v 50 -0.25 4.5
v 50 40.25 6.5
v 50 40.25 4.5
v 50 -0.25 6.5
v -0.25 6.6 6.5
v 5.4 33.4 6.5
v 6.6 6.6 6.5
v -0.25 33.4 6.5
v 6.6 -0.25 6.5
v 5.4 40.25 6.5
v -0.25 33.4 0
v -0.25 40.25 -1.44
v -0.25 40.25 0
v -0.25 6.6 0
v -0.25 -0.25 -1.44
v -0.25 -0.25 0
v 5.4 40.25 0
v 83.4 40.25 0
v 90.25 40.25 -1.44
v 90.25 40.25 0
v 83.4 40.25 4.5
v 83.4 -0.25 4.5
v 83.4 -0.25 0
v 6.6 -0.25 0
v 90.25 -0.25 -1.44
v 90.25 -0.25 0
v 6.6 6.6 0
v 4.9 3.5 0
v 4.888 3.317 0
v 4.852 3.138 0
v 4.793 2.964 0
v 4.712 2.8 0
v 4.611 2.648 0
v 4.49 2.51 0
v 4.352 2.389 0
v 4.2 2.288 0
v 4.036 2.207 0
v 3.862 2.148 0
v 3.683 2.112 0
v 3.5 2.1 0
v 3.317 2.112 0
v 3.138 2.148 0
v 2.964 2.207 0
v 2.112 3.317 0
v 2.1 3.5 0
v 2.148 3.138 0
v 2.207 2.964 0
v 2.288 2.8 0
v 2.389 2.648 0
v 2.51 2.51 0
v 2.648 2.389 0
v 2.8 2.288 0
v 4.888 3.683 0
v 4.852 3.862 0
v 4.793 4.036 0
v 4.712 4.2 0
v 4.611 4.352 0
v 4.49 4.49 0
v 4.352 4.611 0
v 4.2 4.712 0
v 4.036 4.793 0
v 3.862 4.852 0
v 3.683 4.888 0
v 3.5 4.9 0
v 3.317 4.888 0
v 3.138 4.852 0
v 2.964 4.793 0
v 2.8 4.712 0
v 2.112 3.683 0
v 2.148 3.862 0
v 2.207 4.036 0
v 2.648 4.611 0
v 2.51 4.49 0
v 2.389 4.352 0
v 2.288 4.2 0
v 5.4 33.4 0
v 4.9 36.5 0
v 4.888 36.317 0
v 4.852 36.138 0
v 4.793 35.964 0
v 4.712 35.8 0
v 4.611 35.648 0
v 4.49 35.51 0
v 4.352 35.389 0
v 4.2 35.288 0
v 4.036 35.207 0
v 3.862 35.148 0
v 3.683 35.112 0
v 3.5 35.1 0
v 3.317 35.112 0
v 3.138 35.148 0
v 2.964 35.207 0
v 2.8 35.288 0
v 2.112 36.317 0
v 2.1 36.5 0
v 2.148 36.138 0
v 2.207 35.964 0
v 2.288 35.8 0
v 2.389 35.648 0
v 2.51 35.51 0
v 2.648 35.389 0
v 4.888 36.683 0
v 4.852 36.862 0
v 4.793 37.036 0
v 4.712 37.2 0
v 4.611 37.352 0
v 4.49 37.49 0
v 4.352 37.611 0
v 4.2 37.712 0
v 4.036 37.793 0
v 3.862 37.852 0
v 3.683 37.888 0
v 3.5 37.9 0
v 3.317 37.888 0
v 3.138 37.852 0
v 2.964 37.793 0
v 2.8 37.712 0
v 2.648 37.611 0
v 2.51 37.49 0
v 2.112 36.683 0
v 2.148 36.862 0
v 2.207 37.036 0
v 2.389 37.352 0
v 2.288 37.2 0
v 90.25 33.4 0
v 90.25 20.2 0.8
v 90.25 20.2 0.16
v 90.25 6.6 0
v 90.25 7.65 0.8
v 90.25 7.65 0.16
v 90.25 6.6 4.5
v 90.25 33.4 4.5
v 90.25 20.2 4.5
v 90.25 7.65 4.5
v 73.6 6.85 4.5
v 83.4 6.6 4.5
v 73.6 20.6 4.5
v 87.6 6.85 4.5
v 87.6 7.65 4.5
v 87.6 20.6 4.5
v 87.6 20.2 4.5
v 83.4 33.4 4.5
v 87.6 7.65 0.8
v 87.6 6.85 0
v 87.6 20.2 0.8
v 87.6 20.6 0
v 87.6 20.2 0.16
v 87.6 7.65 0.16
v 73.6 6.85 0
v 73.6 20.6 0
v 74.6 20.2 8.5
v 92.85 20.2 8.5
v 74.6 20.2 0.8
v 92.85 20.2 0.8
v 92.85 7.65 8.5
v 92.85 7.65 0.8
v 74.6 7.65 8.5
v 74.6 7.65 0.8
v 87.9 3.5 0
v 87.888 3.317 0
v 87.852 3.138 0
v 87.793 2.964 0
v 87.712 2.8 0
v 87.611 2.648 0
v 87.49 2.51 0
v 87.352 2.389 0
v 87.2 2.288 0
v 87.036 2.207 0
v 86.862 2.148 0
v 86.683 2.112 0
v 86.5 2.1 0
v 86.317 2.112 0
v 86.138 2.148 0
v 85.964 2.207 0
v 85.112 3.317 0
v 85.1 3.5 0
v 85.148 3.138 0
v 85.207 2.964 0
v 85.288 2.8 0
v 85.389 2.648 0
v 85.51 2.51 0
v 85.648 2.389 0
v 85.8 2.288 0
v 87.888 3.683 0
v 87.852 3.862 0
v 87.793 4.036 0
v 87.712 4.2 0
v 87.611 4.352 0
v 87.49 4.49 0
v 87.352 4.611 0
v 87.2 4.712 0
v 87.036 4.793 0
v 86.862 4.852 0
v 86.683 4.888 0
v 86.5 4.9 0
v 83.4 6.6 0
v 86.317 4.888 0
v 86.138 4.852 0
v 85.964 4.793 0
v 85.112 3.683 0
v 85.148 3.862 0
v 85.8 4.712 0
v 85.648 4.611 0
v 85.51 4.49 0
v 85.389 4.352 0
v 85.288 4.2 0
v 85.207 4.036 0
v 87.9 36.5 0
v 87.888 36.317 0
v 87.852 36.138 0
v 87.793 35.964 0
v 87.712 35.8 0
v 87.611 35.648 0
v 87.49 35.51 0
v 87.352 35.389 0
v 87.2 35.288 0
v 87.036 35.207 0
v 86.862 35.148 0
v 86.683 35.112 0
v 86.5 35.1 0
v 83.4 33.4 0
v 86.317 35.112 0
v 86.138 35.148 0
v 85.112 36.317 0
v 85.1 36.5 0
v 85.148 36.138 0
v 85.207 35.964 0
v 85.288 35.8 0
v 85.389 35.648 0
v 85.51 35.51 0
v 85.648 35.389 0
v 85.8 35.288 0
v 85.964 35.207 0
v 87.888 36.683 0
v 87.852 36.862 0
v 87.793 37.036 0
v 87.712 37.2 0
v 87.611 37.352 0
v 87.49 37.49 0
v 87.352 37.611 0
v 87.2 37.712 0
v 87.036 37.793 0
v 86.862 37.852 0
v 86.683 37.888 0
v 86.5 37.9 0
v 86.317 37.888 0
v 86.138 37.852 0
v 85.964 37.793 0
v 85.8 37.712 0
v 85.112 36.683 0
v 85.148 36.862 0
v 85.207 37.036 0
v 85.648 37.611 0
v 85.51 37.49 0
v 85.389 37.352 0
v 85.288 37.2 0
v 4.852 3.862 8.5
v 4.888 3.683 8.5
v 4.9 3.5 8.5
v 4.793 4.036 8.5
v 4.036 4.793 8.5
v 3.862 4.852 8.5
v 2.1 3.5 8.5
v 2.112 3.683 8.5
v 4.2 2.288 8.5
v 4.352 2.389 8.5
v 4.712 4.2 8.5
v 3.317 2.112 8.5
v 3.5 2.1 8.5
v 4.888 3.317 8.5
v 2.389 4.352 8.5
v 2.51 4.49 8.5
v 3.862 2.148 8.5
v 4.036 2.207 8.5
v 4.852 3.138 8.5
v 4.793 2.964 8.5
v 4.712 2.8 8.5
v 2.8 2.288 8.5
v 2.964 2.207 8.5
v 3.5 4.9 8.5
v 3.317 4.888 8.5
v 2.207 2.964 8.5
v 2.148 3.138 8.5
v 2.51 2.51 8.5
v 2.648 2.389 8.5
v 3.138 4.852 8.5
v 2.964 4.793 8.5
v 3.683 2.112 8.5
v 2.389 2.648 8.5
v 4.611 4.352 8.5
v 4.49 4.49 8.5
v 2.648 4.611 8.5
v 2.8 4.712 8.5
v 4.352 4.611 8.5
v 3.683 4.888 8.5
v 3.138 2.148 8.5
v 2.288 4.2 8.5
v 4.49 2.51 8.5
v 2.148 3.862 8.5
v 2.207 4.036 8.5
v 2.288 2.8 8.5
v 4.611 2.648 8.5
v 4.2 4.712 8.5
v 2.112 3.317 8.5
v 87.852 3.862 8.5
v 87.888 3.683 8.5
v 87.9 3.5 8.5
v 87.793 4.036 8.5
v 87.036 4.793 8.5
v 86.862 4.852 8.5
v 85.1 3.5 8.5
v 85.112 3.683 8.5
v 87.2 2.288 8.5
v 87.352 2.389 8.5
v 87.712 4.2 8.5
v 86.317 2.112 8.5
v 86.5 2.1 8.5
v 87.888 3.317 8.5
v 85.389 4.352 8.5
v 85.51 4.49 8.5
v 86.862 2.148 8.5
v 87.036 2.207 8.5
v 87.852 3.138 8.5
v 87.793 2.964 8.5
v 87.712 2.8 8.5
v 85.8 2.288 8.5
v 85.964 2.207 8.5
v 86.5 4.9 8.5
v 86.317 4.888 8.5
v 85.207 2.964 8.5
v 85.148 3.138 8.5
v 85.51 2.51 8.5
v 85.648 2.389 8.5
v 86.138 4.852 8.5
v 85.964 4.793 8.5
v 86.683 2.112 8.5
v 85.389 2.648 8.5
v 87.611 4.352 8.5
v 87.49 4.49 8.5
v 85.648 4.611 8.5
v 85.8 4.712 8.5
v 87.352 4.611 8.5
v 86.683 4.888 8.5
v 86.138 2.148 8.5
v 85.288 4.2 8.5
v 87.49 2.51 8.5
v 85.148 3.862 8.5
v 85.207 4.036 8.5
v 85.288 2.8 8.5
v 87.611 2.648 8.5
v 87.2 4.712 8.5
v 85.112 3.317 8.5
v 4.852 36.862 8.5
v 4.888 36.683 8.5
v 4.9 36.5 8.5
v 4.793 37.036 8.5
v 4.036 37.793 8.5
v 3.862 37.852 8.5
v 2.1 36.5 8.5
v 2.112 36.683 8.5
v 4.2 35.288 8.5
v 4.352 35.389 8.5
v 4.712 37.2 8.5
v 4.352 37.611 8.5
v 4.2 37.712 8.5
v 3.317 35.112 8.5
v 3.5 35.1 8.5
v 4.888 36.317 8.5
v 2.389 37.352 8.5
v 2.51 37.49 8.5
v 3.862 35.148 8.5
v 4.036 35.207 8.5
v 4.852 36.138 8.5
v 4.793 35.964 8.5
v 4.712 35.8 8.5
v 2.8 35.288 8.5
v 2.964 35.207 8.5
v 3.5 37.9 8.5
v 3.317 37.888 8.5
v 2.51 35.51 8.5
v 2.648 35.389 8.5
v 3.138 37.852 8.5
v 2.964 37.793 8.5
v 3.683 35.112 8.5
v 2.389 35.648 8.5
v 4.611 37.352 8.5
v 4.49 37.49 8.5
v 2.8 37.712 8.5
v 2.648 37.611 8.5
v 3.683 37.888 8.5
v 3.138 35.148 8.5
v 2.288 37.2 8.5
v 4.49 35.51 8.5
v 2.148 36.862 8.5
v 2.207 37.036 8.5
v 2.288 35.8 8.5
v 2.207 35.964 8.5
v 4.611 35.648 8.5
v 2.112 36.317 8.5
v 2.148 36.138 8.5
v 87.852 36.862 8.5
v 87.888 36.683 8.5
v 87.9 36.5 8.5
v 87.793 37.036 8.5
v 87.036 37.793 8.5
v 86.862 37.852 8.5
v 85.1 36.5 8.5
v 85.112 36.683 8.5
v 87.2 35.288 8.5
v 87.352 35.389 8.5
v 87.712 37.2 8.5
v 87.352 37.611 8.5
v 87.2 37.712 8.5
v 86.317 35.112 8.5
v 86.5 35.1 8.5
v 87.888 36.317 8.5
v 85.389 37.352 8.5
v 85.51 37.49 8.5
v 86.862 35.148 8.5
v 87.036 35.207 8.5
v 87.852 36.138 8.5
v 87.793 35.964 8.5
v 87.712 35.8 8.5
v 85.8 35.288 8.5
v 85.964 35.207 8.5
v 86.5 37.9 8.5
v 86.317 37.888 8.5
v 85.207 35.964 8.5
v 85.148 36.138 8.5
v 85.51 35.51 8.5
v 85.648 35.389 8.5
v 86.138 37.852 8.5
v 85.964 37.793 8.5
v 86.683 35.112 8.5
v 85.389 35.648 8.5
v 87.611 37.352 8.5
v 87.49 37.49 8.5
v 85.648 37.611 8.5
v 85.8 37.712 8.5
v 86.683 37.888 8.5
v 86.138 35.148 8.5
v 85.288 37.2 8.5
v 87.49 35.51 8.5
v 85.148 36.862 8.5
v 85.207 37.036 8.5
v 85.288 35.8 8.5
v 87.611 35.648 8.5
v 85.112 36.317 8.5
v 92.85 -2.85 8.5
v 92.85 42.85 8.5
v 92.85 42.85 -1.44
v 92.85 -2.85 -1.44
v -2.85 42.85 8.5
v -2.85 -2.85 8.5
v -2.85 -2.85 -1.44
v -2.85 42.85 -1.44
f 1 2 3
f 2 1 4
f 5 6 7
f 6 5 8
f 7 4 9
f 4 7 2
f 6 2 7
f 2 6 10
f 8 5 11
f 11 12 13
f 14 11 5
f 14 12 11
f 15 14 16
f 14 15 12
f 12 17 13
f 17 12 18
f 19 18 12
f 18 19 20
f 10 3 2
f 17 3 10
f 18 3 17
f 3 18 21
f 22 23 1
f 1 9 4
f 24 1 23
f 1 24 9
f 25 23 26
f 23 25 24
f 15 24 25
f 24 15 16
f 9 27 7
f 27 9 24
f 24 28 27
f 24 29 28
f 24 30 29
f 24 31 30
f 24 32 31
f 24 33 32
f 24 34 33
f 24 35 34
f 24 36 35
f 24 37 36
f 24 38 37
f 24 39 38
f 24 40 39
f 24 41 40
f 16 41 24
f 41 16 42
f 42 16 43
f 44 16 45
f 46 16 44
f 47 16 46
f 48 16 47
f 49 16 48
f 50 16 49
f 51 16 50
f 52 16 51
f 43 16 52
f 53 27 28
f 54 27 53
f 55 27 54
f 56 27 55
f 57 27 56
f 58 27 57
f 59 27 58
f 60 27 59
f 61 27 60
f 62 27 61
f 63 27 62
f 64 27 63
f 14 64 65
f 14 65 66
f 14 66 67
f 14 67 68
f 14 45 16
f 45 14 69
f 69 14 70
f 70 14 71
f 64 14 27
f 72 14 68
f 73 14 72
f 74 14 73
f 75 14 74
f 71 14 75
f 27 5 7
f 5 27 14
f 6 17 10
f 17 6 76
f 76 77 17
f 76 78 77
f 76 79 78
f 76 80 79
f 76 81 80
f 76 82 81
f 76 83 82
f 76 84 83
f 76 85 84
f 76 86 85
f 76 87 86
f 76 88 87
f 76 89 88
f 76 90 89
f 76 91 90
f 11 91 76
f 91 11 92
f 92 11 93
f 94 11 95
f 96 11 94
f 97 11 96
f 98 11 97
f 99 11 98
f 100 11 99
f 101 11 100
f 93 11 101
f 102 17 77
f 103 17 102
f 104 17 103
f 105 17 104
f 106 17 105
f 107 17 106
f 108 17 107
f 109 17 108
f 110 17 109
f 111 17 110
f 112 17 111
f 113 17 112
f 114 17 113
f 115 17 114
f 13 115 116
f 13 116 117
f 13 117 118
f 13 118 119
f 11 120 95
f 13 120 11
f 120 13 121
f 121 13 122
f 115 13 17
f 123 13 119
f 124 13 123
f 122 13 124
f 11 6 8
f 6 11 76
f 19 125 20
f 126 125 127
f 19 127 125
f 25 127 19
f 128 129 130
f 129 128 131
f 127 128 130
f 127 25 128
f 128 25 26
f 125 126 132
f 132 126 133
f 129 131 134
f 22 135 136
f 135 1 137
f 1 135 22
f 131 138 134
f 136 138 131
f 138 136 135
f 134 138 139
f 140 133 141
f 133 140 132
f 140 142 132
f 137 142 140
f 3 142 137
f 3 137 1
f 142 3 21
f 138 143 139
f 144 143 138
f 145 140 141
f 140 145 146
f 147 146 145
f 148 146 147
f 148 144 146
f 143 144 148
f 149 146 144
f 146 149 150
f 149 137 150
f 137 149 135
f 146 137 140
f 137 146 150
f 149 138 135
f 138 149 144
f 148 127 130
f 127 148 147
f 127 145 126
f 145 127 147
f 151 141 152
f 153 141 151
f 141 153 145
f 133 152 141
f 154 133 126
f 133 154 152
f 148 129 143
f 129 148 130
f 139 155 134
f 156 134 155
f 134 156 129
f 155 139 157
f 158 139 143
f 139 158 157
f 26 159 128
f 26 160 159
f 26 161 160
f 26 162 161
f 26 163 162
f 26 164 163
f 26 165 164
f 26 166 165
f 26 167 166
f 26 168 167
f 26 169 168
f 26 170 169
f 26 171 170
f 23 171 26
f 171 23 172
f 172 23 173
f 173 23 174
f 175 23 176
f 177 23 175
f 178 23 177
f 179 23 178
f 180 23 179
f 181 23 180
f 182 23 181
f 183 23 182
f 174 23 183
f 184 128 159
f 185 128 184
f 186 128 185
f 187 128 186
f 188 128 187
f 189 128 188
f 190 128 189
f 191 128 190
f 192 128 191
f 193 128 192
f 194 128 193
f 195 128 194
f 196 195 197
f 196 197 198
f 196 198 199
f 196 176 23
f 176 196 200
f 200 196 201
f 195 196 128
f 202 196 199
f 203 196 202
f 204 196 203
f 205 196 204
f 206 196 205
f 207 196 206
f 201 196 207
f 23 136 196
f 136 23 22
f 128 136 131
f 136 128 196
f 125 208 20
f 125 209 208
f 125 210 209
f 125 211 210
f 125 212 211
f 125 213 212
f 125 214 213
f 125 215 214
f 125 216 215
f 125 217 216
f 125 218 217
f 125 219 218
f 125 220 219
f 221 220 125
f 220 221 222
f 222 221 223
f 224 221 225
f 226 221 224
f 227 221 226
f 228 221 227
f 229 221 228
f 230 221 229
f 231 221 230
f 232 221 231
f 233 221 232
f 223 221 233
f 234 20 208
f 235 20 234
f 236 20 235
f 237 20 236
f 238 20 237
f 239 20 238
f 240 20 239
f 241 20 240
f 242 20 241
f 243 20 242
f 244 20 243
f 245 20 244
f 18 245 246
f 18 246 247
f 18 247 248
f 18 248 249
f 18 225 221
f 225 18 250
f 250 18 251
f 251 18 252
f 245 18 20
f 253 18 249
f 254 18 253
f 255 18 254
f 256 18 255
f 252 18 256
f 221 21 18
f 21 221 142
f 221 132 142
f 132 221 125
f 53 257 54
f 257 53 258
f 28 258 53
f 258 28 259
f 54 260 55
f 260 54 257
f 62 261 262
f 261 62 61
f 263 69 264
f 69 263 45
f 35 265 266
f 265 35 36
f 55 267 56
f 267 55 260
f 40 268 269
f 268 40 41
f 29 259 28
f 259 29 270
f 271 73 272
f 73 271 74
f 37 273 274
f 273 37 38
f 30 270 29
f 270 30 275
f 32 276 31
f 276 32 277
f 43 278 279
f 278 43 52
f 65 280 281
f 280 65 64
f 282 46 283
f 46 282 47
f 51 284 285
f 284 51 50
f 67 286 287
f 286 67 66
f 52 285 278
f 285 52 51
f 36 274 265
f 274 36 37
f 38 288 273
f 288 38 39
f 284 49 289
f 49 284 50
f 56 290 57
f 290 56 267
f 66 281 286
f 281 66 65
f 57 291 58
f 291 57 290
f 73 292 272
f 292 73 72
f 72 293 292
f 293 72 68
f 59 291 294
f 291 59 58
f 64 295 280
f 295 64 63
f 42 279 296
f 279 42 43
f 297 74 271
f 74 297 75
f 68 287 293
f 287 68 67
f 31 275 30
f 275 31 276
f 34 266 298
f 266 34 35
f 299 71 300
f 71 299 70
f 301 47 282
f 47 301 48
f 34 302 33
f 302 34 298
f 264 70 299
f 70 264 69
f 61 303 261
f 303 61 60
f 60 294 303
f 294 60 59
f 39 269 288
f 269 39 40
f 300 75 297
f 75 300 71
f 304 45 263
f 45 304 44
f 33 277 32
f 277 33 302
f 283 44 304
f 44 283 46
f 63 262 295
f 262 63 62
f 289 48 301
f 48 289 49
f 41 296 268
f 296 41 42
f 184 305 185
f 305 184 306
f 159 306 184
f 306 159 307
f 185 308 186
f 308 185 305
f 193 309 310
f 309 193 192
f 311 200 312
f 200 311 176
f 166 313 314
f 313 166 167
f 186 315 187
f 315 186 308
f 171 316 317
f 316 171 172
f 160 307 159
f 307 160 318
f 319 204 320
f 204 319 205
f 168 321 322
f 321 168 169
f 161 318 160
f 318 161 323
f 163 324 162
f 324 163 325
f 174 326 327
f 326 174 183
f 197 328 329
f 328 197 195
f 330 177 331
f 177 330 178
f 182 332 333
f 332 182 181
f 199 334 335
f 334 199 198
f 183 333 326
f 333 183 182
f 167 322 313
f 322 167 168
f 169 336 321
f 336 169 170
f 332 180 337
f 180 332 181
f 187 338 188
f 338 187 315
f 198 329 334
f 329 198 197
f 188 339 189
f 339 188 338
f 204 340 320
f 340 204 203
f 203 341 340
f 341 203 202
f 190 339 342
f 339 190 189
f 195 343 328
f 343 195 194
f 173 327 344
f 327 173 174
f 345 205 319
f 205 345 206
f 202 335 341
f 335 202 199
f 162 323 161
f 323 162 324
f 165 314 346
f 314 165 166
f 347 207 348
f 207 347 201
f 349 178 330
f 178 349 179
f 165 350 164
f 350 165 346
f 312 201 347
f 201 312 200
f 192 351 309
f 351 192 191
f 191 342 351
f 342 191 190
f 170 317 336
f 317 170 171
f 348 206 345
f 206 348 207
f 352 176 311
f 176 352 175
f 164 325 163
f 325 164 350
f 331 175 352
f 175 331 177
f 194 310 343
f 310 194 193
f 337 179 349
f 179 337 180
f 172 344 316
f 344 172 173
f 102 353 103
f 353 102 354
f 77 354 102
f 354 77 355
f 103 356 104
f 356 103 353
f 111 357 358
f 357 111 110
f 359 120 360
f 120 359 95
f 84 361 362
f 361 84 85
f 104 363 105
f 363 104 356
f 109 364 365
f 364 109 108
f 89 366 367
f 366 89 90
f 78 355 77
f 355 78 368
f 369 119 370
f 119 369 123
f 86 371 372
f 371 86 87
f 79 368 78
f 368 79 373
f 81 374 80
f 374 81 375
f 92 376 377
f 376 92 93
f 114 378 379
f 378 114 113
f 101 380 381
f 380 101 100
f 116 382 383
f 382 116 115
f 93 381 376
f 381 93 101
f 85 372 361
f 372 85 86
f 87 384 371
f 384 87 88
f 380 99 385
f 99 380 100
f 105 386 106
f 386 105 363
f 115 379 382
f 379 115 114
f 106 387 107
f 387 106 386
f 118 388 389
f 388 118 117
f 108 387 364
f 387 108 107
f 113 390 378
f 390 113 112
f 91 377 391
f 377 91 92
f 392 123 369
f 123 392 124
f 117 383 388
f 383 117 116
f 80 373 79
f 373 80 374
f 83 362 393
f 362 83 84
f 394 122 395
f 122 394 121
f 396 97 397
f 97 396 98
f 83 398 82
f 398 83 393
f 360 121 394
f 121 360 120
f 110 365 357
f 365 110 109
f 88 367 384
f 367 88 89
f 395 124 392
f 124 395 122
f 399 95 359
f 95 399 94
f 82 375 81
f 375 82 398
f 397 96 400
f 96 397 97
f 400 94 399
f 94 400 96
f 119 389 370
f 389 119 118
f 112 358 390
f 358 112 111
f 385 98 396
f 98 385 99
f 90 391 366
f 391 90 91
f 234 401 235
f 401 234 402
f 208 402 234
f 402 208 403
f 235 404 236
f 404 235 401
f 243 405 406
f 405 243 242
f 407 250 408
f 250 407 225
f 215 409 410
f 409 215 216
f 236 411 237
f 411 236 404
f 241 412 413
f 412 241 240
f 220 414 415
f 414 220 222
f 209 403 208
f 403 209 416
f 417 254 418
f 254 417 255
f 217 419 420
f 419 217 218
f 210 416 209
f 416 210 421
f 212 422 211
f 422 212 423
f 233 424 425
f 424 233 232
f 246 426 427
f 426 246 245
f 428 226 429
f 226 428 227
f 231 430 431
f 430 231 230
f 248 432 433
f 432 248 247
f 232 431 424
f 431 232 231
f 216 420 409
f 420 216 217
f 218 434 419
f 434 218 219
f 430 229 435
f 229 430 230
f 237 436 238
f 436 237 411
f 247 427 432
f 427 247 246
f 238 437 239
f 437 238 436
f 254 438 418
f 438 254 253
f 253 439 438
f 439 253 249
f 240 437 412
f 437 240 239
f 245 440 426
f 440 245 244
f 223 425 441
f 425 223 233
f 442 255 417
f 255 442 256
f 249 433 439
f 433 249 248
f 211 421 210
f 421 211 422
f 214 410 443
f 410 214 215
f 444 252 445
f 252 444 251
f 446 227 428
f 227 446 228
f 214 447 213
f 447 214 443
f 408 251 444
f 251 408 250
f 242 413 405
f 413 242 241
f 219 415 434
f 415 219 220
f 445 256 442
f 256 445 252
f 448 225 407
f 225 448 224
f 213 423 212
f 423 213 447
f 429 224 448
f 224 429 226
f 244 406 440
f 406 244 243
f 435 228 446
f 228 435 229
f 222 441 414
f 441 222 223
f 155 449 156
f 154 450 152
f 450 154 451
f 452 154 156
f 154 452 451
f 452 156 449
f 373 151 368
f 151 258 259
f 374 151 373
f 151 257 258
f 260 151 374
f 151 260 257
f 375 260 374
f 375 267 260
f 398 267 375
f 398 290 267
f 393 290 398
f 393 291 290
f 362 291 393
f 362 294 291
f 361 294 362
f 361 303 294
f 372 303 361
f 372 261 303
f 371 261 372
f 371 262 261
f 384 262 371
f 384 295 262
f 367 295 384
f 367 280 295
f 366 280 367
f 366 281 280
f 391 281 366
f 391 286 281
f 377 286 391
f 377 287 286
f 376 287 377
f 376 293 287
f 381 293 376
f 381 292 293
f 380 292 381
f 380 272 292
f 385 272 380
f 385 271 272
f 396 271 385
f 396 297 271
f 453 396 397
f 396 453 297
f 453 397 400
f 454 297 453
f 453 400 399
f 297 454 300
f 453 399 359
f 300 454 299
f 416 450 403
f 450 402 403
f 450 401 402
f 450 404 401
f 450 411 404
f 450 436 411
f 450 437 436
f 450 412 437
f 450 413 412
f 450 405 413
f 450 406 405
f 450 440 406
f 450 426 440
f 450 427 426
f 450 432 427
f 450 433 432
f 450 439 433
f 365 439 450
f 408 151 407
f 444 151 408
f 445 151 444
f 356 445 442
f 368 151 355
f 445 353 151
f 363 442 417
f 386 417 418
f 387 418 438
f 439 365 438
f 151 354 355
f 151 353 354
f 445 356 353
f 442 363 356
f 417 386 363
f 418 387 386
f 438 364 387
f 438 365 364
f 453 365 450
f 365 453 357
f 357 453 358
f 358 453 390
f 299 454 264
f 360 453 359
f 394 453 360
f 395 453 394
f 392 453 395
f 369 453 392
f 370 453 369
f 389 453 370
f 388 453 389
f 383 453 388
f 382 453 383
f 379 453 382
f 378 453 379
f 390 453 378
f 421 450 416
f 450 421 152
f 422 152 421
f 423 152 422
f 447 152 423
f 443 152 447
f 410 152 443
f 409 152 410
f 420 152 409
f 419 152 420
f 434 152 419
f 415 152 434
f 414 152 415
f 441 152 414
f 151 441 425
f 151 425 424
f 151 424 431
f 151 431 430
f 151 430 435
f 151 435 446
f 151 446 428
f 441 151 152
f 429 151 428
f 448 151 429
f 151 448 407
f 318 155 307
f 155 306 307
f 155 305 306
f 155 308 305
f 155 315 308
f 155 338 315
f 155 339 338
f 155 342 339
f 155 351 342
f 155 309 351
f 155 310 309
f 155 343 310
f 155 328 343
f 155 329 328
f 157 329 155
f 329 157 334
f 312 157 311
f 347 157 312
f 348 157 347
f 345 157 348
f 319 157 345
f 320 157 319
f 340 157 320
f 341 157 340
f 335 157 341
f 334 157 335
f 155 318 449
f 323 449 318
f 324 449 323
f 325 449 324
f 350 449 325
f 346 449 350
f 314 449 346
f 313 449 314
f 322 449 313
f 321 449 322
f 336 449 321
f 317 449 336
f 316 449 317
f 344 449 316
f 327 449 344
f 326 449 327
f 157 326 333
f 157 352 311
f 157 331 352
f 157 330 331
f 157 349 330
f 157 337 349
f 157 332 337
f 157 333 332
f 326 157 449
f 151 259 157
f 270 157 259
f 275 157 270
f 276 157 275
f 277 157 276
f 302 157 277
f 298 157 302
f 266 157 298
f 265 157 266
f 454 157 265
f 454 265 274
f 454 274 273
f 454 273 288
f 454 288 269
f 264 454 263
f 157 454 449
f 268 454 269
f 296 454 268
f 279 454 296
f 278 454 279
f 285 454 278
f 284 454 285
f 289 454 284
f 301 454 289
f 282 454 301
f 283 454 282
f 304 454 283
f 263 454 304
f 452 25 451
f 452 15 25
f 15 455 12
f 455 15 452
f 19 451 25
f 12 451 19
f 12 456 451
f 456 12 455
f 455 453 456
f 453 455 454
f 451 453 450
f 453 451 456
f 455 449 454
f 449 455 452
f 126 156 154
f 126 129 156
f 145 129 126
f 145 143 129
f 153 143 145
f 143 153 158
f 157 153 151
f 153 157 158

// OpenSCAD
// ISAC_868_Enclosure_0p80mm.scad -- Rev E.5 Uniform-Flat-Roof Waterproof Enclosure
// Coordinate System: Right-Handed AuxOrigin / Gerber / STEP (+X East 0..90, +Y North 0..40, +Z Up above F.Cu)
// Key Rev E.5 Features (1:1 synchronized with gen_enclosure.py):
//   1. 100% Uniform Flat Waterproof Top Cover (z_top = +8.50 mm across entire roof; J1..J5 DNP; zero domes or roof slots!)
//   2. Open-East Self-Draining 0.80 mm UV-Stabilized ASA / PETG Sensing Deck (X = 74.60..92.85 mm, 0.00 mm dam lip!)
//   3. Symmetric 95.70 x 45.70 mm Outer Shell with Compliant Z_SKIRT_BOT = -1.44 mm (+0.16 mm tolerance gap) &
//      Continuous 360-Deg Parker ORD 5700 Face-Seal O-Ring Groove (1.80 x 0.76 mm -> 0.92 mm gland, 23.3% squeeze, 68.3% fill)
$fn = 48;

w_pcb = 90.00;  h_pcb = 40.00;  t_pcb = 1.60;
z_skirt_bot = -1.44;            clr = 0.25;     wall = 2.60;
groove_margin = 0.400;          groove_w = 1.80;  groove_d = 0.76;
groove_r_in = 0.60;             groove_r_out = 2.40;
t_asa_window = 0.80;

win_x0 = 74.60; win_x1 = 86.60;
win_y0 = 7.65;  win_y1 = 20.20;
boss_x0 = 73.60; boss_x1 = 87.60;
boss_y0 = 6.85;  boss_y1 = 20.60;

holes = [[3.5, 3.5], [86.5, 3.5], [3.5, 36.5], [86.5, 36.5]];

module rounded_rect_2d(x0, y0, w, h, r) {
    offset(r = r)
        translate([x0 + r, y0 + r])
            square([w - 2*r, h - 2*r]);
}

module parker_oring_groove_2d() {
    difference() {
        rounded_rect_2d(-clr - wall + groove_margin, -clr - wall + groove_margin,
                        w_pcb + 2*(clr + wall - groove_margin),
                        h_pcb + 2*(clr + wall - groove_margin),
                        groove_r_out);
        rounded_rect_2d(-clr - wall + groove_margin + groove_w, -clr - wall + groove_margin + groove_w,
                        w_pcb + 2*(clr + wall - groove_margin - groove_w),
                        h_pcb + 2*(clr + wall - groove_margin - groove_w),
                        groove_r_in);
    }
}

module lid_0p80mm() {
    difference() {
        // 100% uniform flat solid-roof outer shell (95.70 x 45.70 mm, z = -1.44..+8.50 mm compliant skirt)
        translate([-clr - wall, -clr - wall, z_skirt_bot])
            cube([w_pcb + 2*(clr + wall), h_pcb + 2*(clr + wall), 8.50 - z_skirt_bot]);
        // Electronics bay internal cavity (X = 0..50 mm, uniform solid ceiling z = 6.50 mm)
        difference() {
            translate([-clr, -clr, -t_pcb - 0.1])
                cube([50.0 + clr, h_pcb + 2*clr, 6.50 + t_pcb + 0.1]);
            translate([-clr, -clr, 0]) cube([3.5 + 3.1 + clr, 3.5 + 3.1 + clr, 8.0]);
            translate([-clr, 36.5 - 3.1, 0]) cube([5.40 + clr, 3.5 + 3.1 + clr, 8.0]);
        }
        // Antenna free-air cavity (X = 50..90 mm, ceiling z = 4.50 mm)
        difference() {
            translate([50.0, -clr, -t_pcb - 0.1])
                cube([40.0 + clr, h_pcb + 2*clr, 4.50 + t_pcb + 0.1]);
            translate([boss_x0, boss_y0, 0])
                cube([boss_x1 - boss_x0, boss_y1 - boss_y0, 5.0]);
            translate([boss_x1, win_y0, 0.16])
                cube([(w_pcb + clr) - boss_x1, win_y1 - win_y0, 5.0]);
            translate([86.5 - 3.1, -clr, 0]) cube([3.5 + 3.1 + clr, 3.5 + 3.1 + clr, 5.0]);
            translate([86.5 - 3.1, 36.5 - 3.1, 0]) cube([3.5 + 3.1 + clr, 3.5 + 3.1 + clr, 5.0]);
        }
        // Open-East self-draining runoff cut (flush z_top = +0.80 mm all the way through X = 92.85 mm!)
        translate([win_x0, win_y0, t_asa_window])
            cube([(w_pcb + clr + wall + 0.2) - win_x0, win_y1 - win_y0, 9.0]);
        // 4 x M2.5 Nylon screw through-holes
        for (h = holes)
            translate([h[0], h[1], -t_pcb - 1]) cylinder(d = 2.80, h = 14.0);
    }
}

module base_tray_option_a_slim() {
    difference() {
        translate([-clr - wall, -clr - wall, -7.60])
            cube([w_pcb + 2*(clr + wall), h_pcb + 2*(clr + wall), 6.00]);
        // Continuous 360-degree unbroken 1.80 x 0.76 mm Parker ORD 5700 concentric-corner face-seal O-ring groove
        translate([0, 0, -t_pcb - groove_d])
            linear_extrude(height = groove_d + 0.1) parker_oring_groove_2d();
        // Main 4.00 mm unloaded air pocket
        difference() {
            translate([-clr, -clr, -5.60])
                cube([w_pcb + 2*clr, h_pcb + 2*clr, 4.20]);
            translate([-clr, -clr, -5.70]) cube([3.5 + 3.1 + clr, 3.5 + 3.1 + clr, 4.15]);
            translate([-clr, 36.5 - 3.1, -5.70]) cube([3.5 + 3.1 + clr, 3.5 + 3.1 + clr, 4.15]);
            translate([86.5 - 3.1, -clr, -5.70]) cube([3.5 + 3.1 + clr, 3.5 + 3.1 + clr, 4.15]);
            translate([86.5 - 3.1, 36.5 - 3.1, -5.70]) cube([3.5 + 3.1 + clr, 3.5 + 3.1 + clr, 4.15]);
            translate([7.00, 4.70, -5.70])
                cube([39.20, 29.00, 2.94]);
        }
        // Option A 302535/352535 LiPo pocket + under-PCB J2 direct-solder wire-relief channel (-6.16 mm)
        translate([8.60, 6.30, -6.16])
            cube([36.00, 25.80, 4.00]);
        translate([7.40, 31.50, -6.16])
            cube([7.60, 6.15, 4.70]);
        // 4 x M2.5 Nylon screw through-holes
        for (h = holes)
            translate([h[0], h[1], -10.0]) cylinder(d = 2.80, h = 10.0);
    }
}

module base_tray_battery() {
    difference() {
        union() {
            translate([-clr - wall, -clr - wall, -7.60])
                cube([w_pcb + 2*(clr + wall), h_pcb + 2*(clr + wall), 6.00]);
            translate([6.60, 9.60, -19.10])
                cube([42.80, 19.20, 13.50]);
        }
        // Continuous 360-degree unbroken 1.80 x 0.76 mm Parker ORD 5700 concentric-corner face-seal O-ring groove
        translate([0, 0, -t_pcb - groove_d])
            linear_extrude(height = groove_d + 0.1) parker_oring_groove_2d();
        difference() {
            translate([-clr, -clr, -5.60])
                cube([w_pcb + 2*clr, h_pcb + 2*clr, 4.20]);
            translate([-clr, -clr, -5.70]) cube([3.5 + 3.1 + clr, 3.5 + 3.1 + clr, 4.15]);
            translate([-clr, 36.5 - 3.1, -5.70]) cube([3.5 + 3.1 + clr, 3.5 + 3.1 + clr, 4.15]);
            translate([86.5 - 3.1, -clr, -5.70]) cube([3.5 + 3.1 + clr, 3.5 + 3.1 + clr, 4.15]);
            translate([86.5 - 3.1, 36.5 - 3.1, -5.70]) cube([3.5 + 3.1 + clr, 3.5 + 3.1 + clr, 4.15]);
        }
        translate([8.60, 11.60, -17.10])
            cube([38.80, 15.20, 11.70]);
        translate([8.60, 6.30, -6.16])
            cube([36.00, 25.80, 4.00]);
        translate([7.40, 31.50, -6.16])
            cube([7.60, 6.15, 4.70]);
        for (h = holes)
            translate([h[0], h[1], -20.0]) cylinder(d = 2.80, h = 20.0);
    }
}

lid_0p80mm();
// translate([0, 0, -12]) base_tray_battery();
